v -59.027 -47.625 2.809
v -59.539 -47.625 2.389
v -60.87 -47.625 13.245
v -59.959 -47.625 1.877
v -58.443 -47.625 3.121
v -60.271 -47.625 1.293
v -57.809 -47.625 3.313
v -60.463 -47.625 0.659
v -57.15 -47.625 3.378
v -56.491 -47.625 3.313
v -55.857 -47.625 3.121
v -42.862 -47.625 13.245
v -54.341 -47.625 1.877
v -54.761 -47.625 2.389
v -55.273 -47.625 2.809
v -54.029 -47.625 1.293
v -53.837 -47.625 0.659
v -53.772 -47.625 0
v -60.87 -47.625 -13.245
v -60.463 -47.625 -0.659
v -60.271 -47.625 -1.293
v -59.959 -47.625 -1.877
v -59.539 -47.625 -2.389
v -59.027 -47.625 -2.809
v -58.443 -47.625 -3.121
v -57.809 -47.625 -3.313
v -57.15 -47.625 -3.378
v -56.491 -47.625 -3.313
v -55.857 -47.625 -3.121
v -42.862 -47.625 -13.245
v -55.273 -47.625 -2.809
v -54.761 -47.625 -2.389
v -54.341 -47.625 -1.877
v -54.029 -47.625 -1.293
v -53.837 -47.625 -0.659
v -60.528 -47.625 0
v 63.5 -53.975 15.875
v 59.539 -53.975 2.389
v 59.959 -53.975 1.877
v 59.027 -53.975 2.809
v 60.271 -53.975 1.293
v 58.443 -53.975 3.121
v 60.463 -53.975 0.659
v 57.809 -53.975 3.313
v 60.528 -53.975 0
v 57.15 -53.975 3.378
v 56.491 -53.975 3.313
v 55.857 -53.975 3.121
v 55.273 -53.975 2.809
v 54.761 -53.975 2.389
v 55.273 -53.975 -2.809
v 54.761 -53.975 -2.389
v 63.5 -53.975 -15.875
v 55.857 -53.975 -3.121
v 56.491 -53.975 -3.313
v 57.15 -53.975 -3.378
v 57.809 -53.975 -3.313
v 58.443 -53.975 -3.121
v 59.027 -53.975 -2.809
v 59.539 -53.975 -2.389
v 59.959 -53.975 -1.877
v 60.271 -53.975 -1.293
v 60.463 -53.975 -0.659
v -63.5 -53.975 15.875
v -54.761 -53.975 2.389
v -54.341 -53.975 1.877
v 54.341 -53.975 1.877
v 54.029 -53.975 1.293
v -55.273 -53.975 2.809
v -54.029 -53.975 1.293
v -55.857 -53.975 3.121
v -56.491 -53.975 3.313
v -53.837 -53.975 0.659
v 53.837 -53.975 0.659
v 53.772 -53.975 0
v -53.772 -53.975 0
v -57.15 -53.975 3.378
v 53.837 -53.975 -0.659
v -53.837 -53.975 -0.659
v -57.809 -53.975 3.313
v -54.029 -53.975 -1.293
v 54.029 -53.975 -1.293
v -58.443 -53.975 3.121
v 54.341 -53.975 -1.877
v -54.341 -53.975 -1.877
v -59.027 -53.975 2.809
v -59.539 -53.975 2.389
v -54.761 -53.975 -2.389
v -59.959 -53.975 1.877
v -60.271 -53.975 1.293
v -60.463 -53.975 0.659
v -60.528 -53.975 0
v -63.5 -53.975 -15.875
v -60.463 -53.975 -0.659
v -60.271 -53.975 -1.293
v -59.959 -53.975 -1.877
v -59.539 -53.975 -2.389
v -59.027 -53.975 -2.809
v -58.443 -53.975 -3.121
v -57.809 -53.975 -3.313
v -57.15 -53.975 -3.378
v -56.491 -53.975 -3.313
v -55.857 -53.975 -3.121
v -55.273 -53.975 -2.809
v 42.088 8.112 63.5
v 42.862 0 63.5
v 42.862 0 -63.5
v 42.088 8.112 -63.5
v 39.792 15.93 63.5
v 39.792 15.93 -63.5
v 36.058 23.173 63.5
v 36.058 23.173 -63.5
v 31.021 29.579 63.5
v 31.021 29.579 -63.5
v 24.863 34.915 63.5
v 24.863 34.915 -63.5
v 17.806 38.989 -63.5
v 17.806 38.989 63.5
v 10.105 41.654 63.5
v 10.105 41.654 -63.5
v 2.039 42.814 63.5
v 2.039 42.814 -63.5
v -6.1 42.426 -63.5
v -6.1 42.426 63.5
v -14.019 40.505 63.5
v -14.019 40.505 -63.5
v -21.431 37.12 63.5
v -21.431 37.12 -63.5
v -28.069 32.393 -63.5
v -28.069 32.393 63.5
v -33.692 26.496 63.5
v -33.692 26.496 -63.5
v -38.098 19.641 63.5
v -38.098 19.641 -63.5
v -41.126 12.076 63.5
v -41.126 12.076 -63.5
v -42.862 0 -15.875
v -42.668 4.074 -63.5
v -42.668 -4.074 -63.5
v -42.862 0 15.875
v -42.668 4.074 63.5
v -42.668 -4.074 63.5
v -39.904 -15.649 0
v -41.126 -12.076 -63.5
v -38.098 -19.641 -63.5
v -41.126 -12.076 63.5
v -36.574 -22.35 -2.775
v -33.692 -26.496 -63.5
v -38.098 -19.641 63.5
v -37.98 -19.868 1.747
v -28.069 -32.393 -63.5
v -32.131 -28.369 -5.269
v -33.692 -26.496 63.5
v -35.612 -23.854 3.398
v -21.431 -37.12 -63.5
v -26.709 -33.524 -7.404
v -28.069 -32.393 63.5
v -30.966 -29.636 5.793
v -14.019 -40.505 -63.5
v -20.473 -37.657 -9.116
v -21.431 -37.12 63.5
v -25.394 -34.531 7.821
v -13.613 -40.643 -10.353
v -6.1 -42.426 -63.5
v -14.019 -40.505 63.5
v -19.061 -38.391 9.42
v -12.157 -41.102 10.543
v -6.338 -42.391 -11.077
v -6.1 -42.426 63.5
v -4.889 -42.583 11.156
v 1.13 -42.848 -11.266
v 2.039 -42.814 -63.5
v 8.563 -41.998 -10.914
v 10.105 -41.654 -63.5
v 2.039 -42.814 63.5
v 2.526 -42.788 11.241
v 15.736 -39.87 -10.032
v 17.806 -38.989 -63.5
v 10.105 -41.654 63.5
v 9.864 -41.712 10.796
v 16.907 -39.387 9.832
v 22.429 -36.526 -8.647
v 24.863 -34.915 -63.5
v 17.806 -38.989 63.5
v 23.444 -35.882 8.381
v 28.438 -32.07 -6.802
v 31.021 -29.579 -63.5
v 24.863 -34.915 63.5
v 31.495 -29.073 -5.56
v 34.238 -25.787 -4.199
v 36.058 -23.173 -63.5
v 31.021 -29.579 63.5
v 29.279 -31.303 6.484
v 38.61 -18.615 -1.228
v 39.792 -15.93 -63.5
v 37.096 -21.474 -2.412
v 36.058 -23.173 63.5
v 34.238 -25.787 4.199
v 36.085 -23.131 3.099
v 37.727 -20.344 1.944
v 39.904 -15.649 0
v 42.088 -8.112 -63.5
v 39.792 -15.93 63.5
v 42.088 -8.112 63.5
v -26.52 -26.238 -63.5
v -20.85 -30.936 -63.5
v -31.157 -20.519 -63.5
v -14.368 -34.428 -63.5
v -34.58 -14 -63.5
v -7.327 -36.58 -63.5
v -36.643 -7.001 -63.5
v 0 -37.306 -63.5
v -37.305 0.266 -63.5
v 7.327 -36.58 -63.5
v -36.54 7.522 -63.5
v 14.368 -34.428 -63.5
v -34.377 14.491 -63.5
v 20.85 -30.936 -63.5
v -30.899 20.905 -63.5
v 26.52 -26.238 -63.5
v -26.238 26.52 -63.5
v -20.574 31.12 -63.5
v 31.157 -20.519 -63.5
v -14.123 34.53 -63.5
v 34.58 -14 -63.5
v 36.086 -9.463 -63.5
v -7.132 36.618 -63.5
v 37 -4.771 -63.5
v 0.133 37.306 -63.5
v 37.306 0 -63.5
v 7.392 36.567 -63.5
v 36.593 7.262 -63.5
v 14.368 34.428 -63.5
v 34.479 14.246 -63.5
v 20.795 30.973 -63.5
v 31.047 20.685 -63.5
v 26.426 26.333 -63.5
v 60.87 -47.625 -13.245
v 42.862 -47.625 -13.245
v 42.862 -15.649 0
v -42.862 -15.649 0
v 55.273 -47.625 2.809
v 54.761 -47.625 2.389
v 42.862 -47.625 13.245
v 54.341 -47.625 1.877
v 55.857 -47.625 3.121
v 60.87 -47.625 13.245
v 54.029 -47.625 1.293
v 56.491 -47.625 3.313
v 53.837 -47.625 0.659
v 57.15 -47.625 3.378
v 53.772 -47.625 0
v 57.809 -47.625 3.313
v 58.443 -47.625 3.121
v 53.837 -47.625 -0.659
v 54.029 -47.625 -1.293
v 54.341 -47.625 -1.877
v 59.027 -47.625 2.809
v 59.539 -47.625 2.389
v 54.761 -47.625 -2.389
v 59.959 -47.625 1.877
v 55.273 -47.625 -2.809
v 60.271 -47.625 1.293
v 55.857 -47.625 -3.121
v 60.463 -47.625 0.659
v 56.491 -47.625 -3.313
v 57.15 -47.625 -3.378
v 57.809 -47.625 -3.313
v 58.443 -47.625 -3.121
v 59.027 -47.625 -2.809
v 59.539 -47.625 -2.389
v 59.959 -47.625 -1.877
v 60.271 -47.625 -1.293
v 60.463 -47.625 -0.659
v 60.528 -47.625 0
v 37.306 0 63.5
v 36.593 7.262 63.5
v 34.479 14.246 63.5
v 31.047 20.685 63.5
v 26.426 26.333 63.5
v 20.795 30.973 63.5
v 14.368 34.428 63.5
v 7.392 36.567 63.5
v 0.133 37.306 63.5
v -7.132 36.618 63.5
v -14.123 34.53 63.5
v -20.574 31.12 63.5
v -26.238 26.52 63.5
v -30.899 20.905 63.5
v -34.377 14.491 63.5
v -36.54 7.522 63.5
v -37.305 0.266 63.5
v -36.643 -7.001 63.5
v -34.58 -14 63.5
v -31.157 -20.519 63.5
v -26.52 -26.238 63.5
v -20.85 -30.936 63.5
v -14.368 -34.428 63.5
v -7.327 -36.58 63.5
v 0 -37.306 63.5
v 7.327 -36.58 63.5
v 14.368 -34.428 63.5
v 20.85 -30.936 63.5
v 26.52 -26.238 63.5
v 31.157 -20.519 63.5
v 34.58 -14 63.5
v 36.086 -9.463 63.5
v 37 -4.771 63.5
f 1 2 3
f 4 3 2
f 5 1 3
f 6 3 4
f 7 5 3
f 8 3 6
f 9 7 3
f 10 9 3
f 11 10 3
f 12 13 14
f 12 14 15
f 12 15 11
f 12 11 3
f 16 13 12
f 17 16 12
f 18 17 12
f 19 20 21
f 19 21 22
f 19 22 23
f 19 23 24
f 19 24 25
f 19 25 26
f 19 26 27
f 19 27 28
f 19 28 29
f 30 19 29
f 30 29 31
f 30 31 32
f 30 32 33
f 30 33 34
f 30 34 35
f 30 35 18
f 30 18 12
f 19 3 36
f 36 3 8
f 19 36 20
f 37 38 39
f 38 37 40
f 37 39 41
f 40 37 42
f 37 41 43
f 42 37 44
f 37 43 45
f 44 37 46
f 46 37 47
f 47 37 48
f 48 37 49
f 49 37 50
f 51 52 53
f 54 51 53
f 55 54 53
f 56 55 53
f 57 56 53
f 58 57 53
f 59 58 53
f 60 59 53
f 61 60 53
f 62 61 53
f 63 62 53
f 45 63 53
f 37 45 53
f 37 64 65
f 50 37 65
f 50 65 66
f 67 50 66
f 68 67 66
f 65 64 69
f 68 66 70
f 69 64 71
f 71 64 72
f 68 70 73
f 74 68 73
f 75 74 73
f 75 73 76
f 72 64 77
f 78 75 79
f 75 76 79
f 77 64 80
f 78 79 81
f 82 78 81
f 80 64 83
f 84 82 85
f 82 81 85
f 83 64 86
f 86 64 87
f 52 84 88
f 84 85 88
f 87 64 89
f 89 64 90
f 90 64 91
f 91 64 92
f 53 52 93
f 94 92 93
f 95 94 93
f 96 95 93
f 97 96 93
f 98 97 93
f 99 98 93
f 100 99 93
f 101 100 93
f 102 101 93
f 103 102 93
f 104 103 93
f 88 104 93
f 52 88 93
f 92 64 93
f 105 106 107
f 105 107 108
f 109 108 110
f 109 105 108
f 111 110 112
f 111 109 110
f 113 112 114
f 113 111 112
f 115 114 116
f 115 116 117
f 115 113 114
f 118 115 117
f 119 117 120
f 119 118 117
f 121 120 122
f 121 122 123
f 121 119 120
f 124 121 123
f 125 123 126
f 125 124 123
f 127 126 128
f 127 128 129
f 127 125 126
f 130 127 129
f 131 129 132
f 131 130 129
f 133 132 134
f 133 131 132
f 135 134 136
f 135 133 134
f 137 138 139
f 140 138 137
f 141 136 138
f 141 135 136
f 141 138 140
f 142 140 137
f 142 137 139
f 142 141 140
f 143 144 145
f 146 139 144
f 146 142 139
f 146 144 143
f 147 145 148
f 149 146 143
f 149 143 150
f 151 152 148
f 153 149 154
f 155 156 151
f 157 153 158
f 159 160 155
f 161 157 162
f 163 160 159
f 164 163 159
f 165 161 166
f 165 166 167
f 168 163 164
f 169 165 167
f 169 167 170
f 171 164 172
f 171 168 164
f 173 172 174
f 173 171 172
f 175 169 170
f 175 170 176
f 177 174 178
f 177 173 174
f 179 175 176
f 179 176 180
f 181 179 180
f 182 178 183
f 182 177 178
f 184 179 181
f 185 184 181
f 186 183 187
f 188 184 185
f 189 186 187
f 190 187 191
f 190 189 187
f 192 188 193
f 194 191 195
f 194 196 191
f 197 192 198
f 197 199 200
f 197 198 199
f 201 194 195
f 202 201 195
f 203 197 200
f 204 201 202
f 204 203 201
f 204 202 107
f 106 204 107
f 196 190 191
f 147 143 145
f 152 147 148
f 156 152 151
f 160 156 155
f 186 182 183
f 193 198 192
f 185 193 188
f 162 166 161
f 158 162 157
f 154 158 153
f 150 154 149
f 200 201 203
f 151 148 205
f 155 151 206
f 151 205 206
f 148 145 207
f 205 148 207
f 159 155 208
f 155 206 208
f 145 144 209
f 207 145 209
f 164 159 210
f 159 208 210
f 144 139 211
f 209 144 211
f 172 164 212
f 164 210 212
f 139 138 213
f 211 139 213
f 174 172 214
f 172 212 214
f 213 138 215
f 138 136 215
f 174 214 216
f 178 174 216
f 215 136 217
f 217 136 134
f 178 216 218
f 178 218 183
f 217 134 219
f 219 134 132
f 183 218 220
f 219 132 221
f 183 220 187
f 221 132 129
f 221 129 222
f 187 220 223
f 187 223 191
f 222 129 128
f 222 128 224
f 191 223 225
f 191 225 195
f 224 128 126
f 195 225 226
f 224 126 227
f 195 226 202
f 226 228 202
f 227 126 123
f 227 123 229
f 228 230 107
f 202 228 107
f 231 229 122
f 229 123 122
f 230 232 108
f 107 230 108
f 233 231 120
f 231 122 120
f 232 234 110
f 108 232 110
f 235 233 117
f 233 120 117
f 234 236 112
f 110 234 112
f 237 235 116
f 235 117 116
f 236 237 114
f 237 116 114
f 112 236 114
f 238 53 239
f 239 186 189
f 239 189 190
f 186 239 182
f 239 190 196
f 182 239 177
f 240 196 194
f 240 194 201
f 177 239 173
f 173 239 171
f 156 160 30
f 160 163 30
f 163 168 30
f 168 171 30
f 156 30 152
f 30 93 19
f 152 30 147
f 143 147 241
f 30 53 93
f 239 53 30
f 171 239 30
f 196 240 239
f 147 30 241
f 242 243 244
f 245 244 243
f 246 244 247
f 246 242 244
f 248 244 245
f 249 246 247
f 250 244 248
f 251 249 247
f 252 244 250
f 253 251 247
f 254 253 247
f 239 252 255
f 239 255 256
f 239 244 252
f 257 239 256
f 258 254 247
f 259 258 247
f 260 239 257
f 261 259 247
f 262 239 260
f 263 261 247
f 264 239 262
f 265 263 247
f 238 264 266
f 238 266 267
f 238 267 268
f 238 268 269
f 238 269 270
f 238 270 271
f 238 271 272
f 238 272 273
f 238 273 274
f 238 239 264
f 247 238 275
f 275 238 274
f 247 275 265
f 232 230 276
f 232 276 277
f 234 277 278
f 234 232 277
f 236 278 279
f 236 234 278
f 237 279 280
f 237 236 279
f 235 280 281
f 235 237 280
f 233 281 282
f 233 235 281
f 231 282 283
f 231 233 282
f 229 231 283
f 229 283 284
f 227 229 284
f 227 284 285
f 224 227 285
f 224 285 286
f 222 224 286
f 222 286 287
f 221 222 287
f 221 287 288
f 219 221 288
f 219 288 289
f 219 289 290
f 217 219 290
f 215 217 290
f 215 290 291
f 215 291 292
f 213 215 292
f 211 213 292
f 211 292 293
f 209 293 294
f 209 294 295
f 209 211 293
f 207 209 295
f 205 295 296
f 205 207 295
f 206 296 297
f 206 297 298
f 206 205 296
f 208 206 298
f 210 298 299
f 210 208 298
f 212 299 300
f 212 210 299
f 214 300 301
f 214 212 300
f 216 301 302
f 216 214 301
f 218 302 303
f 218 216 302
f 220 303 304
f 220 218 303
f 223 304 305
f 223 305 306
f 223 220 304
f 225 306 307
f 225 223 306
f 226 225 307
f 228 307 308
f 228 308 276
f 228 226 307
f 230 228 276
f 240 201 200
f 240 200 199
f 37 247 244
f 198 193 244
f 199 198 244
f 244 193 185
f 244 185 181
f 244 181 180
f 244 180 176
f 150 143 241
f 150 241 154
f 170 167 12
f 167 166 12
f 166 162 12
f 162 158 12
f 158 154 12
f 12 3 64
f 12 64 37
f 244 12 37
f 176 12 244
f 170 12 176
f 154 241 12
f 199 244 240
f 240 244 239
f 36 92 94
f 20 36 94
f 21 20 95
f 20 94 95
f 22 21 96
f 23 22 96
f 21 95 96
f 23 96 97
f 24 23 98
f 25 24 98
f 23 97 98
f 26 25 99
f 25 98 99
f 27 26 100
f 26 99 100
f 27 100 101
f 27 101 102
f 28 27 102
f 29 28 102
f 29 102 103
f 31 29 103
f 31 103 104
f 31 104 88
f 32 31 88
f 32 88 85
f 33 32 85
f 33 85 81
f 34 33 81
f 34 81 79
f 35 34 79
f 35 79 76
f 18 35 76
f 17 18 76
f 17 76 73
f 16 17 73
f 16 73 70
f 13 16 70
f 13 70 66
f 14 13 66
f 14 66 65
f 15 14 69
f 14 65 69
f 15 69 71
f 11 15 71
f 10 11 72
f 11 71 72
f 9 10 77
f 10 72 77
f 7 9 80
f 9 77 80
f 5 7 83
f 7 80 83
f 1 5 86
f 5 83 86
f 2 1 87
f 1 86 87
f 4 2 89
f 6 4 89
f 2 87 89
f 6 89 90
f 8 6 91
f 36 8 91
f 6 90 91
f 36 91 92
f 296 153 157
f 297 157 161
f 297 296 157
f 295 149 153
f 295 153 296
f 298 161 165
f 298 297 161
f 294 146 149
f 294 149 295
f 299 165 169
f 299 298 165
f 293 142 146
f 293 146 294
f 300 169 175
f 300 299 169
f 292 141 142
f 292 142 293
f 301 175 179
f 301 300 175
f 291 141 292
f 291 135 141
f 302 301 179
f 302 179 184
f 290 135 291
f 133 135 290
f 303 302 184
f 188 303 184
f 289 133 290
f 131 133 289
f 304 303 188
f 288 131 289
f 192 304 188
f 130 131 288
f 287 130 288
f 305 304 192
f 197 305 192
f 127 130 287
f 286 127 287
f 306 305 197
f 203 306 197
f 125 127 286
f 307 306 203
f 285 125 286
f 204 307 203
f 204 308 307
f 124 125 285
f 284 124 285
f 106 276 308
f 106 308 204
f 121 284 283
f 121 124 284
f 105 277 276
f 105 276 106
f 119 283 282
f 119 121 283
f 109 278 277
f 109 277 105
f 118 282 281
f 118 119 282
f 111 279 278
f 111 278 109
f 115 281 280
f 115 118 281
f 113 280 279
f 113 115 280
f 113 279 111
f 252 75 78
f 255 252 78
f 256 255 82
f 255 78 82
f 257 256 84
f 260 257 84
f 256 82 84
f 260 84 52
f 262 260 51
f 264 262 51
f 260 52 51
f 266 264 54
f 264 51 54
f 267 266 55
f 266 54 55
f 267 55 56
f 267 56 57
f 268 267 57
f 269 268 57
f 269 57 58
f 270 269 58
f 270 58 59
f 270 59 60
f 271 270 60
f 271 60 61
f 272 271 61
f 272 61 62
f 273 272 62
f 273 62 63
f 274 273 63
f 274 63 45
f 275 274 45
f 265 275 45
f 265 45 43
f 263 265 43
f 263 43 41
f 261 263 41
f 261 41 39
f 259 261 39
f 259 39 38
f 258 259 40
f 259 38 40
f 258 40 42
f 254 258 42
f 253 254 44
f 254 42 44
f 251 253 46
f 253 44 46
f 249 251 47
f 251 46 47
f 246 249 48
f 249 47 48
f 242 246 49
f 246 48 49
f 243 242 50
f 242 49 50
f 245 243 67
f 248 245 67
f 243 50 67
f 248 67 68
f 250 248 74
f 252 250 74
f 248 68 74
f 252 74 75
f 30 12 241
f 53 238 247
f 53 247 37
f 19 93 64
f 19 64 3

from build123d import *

# Parameters (mm, degrees)
SKETCH1_R               = 42.8625
SKETCH1_R_2             = 37.30625
BOSS_EXTRUDE1_DEPTH     = 63.5
BOSS_EXTRUDE2_START     = 34.23763648
BOSS_EXTRUDE2_DEPTH     = 13.38736352
BOSS_EXTRUDE2_START_2   = -47.625
BOSS_EXTRUDE2_2_DEPTH   = 4.7624999
BOSS_EXTRUDE2_START_3   = -63.5
BOSS_EXTRUDE2_3_DEPTH   = 127
BOSS_EXTRUDE2_START_4   = -63.5000001
BOSS_EXTRUDE2_4_DEPTH   = 127.0000002
SKETCH3_W               = 20.6375
SKETCH3_H               = 31.75
CUT_EXTRUDE1_DEPTH      = 128.485244907
F_1_4_CLEARANCE_HOLE1_D = 6.7564


with BuildPart() as part:
    # Sketch1 → Boss-Extrude1 (new, symmetric)
    with BuildSketch(Plane.XY):
        Circle(SKETCH1_R)
        Circle(SKETCH1_R_2, mode=Mode.SUBTRACT)
    extrude(amount=BOSS_EXTRUDE1_DEPTH, both=True)

    # Boss-Extrude2: read off the stored shape, not the designer's step
    # Boss-Extrude2 outline → Boss-Extrude2 (add)
    with BuildSketch(Plane.YZ.offset(BOSS_EXTRUDE2_START)):
        Polygon((-53.975, 15.875), (-53.975, -15.875), (-15.649359697, 0), align=None)
    extrude(amount=BOSS_EXTRUDE2_DEPTH)



with BuildPart() as body_2:
    # Boss-Extrude2 2 outline → Boss-Extrude2 2 (new body)
    with BuildSketch(Plane.YZ.offset(BOSS_EXTRUDE2_START_2)):
        Polygon((-53.975, 15.875), (-53.975, -15.875), (-15.649359697, 0), align=None)
    extrude(amount=BOSS_EXTRUDE2_2_DEPTH)


with BuildPart() as part_1:
    add(part.part)

    add(body_2.part)  # Boss-Extrude2 3 merges body 2
    # Boss-Extrude2 3 outline → Boss-Extrude2 3 (add)
    with BuildSketch(Plane.YZ.offset(BOSS_EXTRUDE2_START_3)):
        Polygon((-53.975, 15.875), (-53.975, -15.875), (-15.649359697, 0), align=None)
    extrude(amount=BOSS_EXTRUDE2_3_DEPTH)

    # Boss-Extrude2 4 outline → Boss-Extrude2 4 (cut)
    with BuildSketch(Plane.XY.offset(BOSS_EXTRUDE2_START_4)):
        with BuildLine():
            Line((34.57970921, -14), (-34.57970921, -14))
            ThreePointArc((-34.57970921, -14), (0, -37.30625), (34.57970921, -14))
        make_face()
        Polygon((-47.625, -15.649359697), (-46.941812844, -14), (-63.5, -14), (-63.5, -53.975), align=None)
        Polygon((63.5, -14), (46.941812844, -14), (47.625, -15.649359697), (63.5, -53.975), align=None)
    extrude(amount=BOSS_EXTRUDE2_4_DEPTH, mode=Mode.SUBTRACT)

    # Sketch3 → Cut-Extrude1 (cut, through all)
    with BuildSketch(Plane(origin=(0, -47.625, 0), x_dir=(1, 0, 0), z_dir=(0, 1, 0))):
        with Locations((-53.18125, 0)):
            Rectangle(SKETCH3_W, SKETCH3_H)
        with Locations((53.18125, 0)):
            Rectangle(SKETCH3_W, SKETCH3_H)
    extrude(amount=CUT_EXTRUDE1_DEPTH, mode=Mode.SUBTRACT)

    # 1/4 Clearance Hole1 (through all)
    with Locations(Plane(origin=(0, -47.625, 0), x_dir=(1, 0, 0), z_dir=(0, 1, 0))):
        with Locations((-57.15, 0), (57.15, 0)):
            Hole(F_1_4_CLEARANCE_HOLE1_D / 2)


solid = part_1.part
